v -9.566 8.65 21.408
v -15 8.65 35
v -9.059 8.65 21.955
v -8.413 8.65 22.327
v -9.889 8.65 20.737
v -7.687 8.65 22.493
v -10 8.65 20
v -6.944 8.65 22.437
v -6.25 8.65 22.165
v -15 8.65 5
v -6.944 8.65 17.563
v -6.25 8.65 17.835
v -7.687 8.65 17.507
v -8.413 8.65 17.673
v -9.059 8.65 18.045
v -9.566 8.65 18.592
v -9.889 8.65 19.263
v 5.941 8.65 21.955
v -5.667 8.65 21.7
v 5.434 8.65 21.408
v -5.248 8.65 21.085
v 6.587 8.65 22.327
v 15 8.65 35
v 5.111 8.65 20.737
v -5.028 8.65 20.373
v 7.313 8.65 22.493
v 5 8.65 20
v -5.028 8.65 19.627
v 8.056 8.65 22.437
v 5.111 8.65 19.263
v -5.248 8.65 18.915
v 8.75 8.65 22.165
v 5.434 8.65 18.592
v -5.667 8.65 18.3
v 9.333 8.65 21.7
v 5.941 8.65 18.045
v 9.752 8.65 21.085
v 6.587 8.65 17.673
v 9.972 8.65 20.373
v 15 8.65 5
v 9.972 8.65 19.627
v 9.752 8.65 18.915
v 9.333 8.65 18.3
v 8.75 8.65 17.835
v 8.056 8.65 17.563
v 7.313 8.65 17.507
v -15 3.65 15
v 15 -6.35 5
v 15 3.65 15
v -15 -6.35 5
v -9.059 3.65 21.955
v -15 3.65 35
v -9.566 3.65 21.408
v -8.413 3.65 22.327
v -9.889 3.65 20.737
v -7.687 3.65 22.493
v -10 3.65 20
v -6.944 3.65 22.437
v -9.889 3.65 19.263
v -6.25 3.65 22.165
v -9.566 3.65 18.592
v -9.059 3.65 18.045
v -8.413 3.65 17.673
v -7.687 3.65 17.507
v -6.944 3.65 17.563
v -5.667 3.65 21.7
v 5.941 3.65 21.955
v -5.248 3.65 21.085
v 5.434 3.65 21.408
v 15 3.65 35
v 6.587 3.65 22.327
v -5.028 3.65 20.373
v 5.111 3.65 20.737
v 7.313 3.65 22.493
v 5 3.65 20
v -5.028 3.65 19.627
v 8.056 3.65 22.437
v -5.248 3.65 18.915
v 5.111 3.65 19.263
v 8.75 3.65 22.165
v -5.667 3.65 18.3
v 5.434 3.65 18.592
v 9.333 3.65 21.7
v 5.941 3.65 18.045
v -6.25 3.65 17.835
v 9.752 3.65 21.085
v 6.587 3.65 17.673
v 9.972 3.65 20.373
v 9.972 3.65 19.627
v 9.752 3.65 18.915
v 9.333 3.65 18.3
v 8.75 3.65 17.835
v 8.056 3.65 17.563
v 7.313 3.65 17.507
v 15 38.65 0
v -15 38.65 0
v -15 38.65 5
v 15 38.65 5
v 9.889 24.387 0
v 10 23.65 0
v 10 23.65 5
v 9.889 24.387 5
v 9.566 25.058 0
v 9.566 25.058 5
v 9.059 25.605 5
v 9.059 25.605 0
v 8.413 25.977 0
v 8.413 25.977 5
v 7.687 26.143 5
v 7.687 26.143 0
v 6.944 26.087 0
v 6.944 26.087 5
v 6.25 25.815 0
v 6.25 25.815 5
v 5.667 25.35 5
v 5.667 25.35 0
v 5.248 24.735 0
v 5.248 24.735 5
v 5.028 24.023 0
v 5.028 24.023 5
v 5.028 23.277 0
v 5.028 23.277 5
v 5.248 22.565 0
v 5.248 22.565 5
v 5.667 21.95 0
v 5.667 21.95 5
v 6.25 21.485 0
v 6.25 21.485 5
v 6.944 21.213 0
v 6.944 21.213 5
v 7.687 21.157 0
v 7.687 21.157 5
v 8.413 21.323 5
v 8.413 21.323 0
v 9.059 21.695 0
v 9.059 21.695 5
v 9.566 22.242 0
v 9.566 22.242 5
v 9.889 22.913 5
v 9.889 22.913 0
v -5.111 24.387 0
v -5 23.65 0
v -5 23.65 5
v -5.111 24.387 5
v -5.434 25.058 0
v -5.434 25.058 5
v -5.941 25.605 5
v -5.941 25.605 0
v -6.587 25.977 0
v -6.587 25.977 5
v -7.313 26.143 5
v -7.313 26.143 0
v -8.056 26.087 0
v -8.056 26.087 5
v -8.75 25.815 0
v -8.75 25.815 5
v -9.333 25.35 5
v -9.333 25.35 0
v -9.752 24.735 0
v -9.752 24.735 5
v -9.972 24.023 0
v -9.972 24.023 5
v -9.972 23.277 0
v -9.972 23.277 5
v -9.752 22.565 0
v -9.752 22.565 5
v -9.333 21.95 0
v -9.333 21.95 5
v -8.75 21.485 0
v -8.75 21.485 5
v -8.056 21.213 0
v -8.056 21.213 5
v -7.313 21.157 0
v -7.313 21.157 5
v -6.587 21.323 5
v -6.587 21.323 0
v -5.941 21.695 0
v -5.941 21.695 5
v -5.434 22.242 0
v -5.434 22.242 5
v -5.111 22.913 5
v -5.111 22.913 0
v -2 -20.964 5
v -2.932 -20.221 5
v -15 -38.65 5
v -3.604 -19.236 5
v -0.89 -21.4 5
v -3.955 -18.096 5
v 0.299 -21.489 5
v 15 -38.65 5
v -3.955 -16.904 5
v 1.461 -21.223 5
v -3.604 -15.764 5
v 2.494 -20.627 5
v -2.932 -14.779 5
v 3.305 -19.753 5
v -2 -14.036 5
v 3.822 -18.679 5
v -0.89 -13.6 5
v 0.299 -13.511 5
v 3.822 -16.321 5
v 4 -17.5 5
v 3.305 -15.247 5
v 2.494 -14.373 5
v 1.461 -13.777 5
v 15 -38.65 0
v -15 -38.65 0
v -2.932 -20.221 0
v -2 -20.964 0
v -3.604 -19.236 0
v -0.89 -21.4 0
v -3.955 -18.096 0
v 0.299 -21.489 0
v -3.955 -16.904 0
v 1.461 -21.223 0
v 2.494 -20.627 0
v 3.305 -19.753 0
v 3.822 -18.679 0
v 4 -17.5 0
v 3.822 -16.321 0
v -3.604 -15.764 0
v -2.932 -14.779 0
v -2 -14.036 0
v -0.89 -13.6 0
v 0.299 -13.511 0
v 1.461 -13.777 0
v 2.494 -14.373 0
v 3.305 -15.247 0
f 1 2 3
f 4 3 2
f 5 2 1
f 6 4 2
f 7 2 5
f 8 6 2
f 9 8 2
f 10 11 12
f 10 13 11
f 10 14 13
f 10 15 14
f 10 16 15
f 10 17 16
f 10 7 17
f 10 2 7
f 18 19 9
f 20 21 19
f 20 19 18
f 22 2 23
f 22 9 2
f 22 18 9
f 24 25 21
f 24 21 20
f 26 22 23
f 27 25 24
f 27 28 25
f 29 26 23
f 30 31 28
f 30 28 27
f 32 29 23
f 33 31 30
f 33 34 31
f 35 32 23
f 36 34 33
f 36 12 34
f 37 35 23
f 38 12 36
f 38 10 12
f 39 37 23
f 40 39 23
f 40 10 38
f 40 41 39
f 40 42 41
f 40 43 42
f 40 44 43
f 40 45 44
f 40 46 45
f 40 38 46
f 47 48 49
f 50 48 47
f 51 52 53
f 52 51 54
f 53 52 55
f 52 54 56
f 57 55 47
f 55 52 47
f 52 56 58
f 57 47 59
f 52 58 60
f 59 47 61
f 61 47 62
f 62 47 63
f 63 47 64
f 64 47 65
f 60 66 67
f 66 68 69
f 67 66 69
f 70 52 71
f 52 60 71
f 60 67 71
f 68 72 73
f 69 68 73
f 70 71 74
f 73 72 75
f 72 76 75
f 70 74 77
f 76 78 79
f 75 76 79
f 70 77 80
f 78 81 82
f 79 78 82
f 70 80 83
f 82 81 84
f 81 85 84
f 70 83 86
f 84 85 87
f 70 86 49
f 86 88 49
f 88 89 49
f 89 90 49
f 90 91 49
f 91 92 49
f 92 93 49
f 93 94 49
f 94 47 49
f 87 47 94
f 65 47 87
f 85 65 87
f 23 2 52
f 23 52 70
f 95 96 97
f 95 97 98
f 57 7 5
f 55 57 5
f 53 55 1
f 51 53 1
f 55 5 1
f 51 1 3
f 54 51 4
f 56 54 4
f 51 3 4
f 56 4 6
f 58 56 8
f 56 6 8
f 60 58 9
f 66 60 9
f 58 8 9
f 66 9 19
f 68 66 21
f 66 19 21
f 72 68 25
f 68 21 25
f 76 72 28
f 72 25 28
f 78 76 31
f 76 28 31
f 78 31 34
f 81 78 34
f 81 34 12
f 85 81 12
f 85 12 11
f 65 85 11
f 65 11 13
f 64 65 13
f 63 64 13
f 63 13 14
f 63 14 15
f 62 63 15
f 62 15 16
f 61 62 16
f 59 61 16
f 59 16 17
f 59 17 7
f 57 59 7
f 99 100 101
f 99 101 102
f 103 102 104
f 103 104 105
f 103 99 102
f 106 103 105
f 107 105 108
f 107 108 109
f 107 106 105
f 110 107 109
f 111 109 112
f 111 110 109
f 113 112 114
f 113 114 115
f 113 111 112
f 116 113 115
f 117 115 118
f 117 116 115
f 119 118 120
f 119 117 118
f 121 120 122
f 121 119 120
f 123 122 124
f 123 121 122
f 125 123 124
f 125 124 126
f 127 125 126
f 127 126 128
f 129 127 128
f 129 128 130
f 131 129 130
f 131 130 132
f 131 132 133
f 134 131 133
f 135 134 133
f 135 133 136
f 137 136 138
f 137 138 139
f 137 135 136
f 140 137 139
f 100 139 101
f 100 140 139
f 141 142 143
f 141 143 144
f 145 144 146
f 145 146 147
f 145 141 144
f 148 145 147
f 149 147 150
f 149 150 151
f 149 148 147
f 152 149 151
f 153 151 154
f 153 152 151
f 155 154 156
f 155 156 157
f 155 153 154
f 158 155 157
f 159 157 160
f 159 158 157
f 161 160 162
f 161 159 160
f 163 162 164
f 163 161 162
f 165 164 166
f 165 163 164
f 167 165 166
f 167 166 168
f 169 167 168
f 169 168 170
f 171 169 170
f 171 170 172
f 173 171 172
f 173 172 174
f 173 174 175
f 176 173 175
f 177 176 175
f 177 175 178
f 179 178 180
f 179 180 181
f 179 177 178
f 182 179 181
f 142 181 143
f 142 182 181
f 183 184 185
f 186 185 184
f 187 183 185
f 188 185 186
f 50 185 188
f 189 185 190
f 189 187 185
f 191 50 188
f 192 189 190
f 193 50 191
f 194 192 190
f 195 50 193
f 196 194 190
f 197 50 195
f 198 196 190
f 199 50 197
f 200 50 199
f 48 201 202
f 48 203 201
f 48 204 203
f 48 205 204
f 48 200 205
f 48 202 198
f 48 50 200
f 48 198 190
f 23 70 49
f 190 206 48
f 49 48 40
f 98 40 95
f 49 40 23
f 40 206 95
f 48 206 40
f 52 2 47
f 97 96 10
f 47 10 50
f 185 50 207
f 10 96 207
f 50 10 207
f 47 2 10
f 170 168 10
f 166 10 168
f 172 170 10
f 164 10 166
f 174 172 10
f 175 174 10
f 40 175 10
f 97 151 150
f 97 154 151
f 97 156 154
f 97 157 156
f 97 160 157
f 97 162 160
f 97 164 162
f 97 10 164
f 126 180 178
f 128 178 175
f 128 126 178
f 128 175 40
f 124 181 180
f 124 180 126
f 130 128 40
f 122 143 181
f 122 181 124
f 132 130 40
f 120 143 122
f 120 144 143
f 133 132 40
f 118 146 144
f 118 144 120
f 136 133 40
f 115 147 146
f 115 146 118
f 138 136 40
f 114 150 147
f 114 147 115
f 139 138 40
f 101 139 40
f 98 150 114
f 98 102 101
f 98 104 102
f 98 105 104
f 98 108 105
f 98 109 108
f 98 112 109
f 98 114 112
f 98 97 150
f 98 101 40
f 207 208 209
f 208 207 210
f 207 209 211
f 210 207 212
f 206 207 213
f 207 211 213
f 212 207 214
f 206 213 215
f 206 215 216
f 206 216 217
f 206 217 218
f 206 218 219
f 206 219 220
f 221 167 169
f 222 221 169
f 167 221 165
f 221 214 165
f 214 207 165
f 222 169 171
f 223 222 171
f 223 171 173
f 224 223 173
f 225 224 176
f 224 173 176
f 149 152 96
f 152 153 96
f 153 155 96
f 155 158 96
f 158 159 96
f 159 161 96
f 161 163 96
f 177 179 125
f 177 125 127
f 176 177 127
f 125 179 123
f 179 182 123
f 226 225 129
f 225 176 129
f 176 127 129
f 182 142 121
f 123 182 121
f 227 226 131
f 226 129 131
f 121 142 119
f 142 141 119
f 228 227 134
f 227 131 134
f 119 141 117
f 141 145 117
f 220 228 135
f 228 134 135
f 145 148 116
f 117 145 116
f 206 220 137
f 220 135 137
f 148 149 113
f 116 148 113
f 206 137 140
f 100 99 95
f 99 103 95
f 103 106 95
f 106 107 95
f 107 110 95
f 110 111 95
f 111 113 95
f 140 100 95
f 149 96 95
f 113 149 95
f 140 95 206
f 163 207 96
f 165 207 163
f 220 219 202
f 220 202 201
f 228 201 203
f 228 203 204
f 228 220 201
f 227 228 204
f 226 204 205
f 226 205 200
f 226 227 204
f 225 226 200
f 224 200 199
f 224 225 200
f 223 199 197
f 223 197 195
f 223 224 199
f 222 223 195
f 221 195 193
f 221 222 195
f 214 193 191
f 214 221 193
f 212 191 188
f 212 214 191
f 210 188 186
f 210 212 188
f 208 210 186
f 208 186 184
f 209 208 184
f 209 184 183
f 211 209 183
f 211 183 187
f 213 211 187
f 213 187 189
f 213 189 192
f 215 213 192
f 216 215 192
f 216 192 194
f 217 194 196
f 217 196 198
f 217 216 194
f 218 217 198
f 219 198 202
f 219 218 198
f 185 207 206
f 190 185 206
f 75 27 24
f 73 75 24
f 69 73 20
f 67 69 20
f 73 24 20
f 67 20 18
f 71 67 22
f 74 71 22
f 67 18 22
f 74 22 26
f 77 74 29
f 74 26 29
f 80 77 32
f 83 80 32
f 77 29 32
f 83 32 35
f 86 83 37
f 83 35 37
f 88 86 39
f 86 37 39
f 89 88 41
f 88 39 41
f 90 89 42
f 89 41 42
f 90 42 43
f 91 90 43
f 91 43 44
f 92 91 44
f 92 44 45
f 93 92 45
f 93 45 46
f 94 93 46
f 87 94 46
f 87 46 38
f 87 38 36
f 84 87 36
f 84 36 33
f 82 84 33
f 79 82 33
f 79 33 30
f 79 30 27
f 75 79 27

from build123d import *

# Parameters (mm, degrees)
F0_W     = 30
F0_H     = 30
F0_R     = 2.5
F0_H_2   = 5
F0_H_3   = 42.3
F0_R_2   = 4
F1_DEPTH = 5
F2_DEPTH = 35
F4_D     = 5
F4_DEPTH = 12.7
F5_SIZE  = 10


with BuildPart() as f1:
    # F0 (on Top) → F1 (new body)
    with BuildSketch(Plane.XY):
        with Locations((0, 23.65)):
            Rectangle(F0_W, F0_H)
        with Locations((-7.5, 23.65)):
            Circle(F0_R, mode=Mode.SUBTRACT)
        with Locations((7.5, 23.65)):
            Circle(F0_R, mode=Mode.SUBTRACT)
        with Locations((0, 6.15)):
            Rectangle(F0_W, F0_H_2)
        with Locations((0, -17.5)):
            Rectangle(F0_W, F0_H_3)
        with Locations((0, -17.5)):
            Circle(F0_R_2, mode=Mode.SUBTRACT)
    extrude(amount=F1_DEPTH)

    # F0 (on Top) → F2 (join)
    with BuildSketch(Plane.XY):
        with Locations((0, 6.15)):
            Rectangle(F0_W, F0_H_2)
    extrude(amount=F2_DEPTH)

    # F4
    with Locations(Plane.XZ):
        with Locations((-7.5, 20), (7.5, 20)):
            Hole(F4_D / 2, depth=F4_DEPTH)

    # F5
    f5_edges = [f1.edges().sort_by_distance(p)[0] for p in [
        (0, 3.65, 5),
    ]]
    chamfer(f5_edges, length=F5_SIZE)


solid = f1.part
